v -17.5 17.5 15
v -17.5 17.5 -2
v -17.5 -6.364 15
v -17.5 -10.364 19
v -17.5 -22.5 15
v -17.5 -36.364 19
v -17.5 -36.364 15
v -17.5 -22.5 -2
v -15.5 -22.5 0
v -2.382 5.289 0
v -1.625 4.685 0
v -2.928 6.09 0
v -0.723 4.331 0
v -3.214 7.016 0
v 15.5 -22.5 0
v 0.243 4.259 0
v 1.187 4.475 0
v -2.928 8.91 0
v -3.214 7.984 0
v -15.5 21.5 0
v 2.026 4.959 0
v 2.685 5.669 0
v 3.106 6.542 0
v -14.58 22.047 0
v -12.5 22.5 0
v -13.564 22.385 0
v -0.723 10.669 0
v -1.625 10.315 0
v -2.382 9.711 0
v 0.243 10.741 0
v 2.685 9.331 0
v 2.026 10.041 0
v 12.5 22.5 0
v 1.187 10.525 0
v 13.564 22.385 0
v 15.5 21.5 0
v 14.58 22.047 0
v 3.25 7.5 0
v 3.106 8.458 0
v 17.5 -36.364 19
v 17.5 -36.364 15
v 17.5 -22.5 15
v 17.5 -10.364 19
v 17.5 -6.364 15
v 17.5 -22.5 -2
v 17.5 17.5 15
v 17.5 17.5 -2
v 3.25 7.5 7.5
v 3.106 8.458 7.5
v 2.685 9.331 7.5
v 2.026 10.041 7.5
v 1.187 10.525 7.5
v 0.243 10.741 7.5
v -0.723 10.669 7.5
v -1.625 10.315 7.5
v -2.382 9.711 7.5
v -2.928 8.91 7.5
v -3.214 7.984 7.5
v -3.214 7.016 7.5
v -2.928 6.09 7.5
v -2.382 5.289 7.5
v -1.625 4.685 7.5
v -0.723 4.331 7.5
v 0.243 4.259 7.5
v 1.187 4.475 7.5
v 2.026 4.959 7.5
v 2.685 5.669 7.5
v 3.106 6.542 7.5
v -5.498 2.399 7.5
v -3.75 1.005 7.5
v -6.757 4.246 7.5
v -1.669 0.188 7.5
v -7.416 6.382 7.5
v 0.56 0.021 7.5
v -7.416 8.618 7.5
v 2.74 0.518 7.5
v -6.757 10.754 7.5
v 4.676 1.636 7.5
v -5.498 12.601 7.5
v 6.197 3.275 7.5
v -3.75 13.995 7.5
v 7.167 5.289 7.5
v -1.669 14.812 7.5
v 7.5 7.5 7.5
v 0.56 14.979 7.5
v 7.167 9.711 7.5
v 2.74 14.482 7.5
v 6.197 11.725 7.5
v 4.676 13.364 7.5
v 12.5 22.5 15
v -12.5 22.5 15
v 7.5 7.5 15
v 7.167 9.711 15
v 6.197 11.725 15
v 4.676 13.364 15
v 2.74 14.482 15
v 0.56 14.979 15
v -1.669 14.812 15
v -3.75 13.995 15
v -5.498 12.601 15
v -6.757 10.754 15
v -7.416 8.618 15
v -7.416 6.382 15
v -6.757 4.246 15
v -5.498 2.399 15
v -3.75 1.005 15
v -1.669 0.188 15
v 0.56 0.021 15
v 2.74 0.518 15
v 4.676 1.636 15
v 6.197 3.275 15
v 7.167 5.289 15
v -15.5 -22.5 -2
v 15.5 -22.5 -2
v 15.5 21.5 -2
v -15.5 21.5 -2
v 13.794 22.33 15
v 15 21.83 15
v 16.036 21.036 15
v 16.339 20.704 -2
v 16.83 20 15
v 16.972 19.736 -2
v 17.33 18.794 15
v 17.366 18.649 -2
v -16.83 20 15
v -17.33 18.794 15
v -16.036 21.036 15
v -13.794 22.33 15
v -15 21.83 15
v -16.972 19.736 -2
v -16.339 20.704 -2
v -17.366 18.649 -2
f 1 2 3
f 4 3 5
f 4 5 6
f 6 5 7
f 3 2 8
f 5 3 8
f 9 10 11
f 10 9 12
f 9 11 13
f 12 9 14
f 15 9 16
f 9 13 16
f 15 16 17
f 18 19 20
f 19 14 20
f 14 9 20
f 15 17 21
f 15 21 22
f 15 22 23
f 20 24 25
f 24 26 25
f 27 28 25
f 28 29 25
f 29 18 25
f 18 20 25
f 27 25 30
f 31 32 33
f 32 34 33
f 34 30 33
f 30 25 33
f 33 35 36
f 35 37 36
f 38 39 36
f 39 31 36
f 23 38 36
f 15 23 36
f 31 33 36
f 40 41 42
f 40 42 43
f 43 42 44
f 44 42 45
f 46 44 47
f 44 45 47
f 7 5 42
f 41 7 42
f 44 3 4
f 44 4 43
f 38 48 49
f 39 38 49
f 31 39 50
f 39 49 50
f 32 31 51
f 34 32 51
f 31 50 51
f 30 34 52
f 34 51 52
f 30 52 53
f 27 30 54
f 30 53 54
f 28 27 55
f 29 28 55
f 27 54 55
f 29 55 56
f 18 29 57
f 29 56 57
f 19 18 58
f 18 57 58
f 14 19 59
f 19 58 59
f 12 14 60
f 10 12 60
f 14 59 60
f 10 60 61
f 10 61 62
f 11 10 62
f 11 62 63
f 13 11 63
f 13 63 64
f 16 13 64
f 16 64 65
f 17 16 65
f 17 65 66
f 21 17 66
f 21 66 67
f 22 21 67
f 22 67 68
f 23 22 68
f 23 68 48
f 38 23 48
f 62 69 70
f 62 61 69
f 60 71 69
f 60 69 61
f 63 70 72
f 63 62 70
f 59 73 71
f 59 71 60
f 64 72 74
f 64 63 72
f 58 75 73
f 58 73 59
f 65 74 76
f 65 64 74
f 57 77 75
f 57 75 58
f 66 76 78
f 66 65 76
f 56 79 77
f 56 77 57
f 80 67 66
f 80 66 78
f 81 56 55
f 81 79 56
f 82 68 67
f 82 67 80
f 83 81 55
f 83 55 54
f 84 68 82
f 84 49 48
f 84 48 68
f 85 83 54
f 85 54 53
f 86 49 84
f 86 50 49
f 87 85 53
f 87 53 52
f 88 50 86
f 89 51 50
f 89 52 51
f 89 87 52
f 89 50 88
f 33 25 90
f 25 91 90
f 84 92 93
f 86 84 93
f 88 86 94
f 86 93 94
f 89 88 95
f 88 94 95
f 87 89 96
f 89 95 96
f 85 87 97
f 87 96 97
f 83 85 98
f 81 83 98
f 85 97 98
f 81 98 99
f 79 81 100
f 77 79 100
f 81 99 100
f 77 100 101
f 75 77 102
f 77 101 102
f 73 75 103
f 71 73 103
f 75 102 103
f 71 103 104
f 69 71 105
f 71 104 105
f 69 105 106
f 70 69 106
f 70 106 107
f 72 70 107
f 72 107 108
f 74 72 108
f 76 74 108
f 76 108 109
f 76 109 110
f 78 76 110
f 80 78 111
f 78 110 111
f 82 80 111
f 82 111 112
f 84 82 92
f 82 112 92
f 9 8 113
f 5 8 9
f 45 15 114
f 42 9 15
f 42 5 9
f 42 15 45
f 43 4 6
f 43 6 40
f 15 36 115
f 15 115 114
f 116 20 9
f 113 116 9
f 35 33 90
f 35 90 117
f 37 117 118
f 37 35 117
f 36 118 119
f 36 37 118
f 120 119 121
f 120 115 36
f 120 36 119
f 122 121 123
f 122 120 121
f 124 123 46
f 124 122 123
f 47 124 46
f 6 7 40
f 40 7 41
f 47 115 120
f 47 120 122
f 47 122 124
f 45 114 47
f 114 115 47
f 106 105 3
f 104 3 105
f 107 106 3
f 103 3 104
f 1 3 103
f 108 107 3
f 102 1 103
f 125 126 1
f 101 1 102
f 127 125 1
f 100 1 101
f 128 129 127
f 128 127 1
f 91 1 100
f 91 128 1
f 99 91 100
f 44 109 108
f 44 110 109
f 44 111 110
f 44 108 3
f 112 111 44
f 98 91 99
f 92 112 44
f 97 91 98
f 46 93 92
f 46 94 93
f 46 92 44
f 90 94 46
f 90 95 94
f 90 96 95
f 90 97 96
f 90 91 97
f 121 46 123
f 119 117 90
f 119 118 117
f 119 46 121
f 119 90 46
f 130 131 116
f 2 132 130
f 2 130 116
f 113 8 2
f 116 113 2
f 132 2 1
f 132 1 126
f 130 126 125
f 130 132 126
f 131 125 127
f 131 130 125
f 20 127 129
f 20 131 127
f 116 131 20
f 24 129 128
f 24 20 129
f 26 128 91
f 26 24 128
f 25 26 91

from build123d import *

# Parameters (mm, degrees)
F0_W      = 35
F0_H      = 45
F1_DEPTH  = 15
F2_W      = 2
F2_H      = 45
F3_DEPTH  = 2
F4_W      = 35
F4_H      = 13.8643281162
F4_H_2    = 16.1356718838
F5_DEPTH  = 4
F6_SIZE   = 3.99999
F7_R      = 3.25
F8_DEPTH  = 15
F9_R      = 5
F10_R     = 7.5
F10_R_2   = 3.25
F11_DEPTH = 7.5


# Not quite as in the source:
# - a fillet or chamfer is up to 0.001 mm smaller than in the source, because OpenCascade refuses the exact size


with BuildPart() as f1:
    # F0 (on Top) → F1 (new body)
    with BuildSketch(Plane.XY):
        Rectangle(F0_W, F0_H)
    extrude(amount=F1_DEPTH)

    # F2 (on face) → F3 (join)
    with BuildSketch(Plane(origin=(0, 0, 0), x_dir=(1, 0, 0), z_dir=(0, 0, -1))):
        with Locations((-16.5, 0)):
            Rectangle(F2_W, F2_H)
        with Locations((16.5, 0)):
            Rectangle(F2_W, F2_H)
    extrude(amount=F3_DEPTH)

    # F4 (on face) → F5 (join)
    with BuildSketch(Plane.XY.offset(15)):
        with Locations((0, -29.4321640581)):
            Rectangle(F4_W, F4_H)
        with Locations((0, -14.4321640581)):
            Rectangle(F4_W, F4_H_2)
    extrude(amount=F5_DEPTH)

    # F6 (size 4 in the source; OpenCascade refuses exactly that, so slightly less here)
    f6_edges = [f1.edges().sort_by_distance(p)[0] for p in [
        (0, -6.364328, 19),
    ]]
    chamfer(f6_edges, length=F6_SIZE)

    # F7 (on face) → F8 (cut, through all)
    with BuildSketch(Plane.XY.offset(15)):
        with Locations((0, 7.5)):
            Circle(F7_R)
    extrude(amount=-F8_DEPTH, mode=Mode.SUBTRACT)

    # F9
    f9_edges = [f1.edges().sort_by_distance(p)[0] for p in [
        (-17.5, 22.5, 6.5),
        (17.5, 22.5, 6.5),
    ]]
    fillet(f9_edges, radius=F9_R)

    # F10 (on face) → F11 (cut)
    with BuildSketch(Plane.XY.offset(15)):
        with Locations((0, 7.5)):
            Circle(F10_R)
        with Locations((0, 7.5)):
            Circle(F10_R_2, mode=Mode.SUBTRACT)
    extrude(amount=-F11_DEPTH, mode=Mode.SUBTRACT)


solid = f1.part
